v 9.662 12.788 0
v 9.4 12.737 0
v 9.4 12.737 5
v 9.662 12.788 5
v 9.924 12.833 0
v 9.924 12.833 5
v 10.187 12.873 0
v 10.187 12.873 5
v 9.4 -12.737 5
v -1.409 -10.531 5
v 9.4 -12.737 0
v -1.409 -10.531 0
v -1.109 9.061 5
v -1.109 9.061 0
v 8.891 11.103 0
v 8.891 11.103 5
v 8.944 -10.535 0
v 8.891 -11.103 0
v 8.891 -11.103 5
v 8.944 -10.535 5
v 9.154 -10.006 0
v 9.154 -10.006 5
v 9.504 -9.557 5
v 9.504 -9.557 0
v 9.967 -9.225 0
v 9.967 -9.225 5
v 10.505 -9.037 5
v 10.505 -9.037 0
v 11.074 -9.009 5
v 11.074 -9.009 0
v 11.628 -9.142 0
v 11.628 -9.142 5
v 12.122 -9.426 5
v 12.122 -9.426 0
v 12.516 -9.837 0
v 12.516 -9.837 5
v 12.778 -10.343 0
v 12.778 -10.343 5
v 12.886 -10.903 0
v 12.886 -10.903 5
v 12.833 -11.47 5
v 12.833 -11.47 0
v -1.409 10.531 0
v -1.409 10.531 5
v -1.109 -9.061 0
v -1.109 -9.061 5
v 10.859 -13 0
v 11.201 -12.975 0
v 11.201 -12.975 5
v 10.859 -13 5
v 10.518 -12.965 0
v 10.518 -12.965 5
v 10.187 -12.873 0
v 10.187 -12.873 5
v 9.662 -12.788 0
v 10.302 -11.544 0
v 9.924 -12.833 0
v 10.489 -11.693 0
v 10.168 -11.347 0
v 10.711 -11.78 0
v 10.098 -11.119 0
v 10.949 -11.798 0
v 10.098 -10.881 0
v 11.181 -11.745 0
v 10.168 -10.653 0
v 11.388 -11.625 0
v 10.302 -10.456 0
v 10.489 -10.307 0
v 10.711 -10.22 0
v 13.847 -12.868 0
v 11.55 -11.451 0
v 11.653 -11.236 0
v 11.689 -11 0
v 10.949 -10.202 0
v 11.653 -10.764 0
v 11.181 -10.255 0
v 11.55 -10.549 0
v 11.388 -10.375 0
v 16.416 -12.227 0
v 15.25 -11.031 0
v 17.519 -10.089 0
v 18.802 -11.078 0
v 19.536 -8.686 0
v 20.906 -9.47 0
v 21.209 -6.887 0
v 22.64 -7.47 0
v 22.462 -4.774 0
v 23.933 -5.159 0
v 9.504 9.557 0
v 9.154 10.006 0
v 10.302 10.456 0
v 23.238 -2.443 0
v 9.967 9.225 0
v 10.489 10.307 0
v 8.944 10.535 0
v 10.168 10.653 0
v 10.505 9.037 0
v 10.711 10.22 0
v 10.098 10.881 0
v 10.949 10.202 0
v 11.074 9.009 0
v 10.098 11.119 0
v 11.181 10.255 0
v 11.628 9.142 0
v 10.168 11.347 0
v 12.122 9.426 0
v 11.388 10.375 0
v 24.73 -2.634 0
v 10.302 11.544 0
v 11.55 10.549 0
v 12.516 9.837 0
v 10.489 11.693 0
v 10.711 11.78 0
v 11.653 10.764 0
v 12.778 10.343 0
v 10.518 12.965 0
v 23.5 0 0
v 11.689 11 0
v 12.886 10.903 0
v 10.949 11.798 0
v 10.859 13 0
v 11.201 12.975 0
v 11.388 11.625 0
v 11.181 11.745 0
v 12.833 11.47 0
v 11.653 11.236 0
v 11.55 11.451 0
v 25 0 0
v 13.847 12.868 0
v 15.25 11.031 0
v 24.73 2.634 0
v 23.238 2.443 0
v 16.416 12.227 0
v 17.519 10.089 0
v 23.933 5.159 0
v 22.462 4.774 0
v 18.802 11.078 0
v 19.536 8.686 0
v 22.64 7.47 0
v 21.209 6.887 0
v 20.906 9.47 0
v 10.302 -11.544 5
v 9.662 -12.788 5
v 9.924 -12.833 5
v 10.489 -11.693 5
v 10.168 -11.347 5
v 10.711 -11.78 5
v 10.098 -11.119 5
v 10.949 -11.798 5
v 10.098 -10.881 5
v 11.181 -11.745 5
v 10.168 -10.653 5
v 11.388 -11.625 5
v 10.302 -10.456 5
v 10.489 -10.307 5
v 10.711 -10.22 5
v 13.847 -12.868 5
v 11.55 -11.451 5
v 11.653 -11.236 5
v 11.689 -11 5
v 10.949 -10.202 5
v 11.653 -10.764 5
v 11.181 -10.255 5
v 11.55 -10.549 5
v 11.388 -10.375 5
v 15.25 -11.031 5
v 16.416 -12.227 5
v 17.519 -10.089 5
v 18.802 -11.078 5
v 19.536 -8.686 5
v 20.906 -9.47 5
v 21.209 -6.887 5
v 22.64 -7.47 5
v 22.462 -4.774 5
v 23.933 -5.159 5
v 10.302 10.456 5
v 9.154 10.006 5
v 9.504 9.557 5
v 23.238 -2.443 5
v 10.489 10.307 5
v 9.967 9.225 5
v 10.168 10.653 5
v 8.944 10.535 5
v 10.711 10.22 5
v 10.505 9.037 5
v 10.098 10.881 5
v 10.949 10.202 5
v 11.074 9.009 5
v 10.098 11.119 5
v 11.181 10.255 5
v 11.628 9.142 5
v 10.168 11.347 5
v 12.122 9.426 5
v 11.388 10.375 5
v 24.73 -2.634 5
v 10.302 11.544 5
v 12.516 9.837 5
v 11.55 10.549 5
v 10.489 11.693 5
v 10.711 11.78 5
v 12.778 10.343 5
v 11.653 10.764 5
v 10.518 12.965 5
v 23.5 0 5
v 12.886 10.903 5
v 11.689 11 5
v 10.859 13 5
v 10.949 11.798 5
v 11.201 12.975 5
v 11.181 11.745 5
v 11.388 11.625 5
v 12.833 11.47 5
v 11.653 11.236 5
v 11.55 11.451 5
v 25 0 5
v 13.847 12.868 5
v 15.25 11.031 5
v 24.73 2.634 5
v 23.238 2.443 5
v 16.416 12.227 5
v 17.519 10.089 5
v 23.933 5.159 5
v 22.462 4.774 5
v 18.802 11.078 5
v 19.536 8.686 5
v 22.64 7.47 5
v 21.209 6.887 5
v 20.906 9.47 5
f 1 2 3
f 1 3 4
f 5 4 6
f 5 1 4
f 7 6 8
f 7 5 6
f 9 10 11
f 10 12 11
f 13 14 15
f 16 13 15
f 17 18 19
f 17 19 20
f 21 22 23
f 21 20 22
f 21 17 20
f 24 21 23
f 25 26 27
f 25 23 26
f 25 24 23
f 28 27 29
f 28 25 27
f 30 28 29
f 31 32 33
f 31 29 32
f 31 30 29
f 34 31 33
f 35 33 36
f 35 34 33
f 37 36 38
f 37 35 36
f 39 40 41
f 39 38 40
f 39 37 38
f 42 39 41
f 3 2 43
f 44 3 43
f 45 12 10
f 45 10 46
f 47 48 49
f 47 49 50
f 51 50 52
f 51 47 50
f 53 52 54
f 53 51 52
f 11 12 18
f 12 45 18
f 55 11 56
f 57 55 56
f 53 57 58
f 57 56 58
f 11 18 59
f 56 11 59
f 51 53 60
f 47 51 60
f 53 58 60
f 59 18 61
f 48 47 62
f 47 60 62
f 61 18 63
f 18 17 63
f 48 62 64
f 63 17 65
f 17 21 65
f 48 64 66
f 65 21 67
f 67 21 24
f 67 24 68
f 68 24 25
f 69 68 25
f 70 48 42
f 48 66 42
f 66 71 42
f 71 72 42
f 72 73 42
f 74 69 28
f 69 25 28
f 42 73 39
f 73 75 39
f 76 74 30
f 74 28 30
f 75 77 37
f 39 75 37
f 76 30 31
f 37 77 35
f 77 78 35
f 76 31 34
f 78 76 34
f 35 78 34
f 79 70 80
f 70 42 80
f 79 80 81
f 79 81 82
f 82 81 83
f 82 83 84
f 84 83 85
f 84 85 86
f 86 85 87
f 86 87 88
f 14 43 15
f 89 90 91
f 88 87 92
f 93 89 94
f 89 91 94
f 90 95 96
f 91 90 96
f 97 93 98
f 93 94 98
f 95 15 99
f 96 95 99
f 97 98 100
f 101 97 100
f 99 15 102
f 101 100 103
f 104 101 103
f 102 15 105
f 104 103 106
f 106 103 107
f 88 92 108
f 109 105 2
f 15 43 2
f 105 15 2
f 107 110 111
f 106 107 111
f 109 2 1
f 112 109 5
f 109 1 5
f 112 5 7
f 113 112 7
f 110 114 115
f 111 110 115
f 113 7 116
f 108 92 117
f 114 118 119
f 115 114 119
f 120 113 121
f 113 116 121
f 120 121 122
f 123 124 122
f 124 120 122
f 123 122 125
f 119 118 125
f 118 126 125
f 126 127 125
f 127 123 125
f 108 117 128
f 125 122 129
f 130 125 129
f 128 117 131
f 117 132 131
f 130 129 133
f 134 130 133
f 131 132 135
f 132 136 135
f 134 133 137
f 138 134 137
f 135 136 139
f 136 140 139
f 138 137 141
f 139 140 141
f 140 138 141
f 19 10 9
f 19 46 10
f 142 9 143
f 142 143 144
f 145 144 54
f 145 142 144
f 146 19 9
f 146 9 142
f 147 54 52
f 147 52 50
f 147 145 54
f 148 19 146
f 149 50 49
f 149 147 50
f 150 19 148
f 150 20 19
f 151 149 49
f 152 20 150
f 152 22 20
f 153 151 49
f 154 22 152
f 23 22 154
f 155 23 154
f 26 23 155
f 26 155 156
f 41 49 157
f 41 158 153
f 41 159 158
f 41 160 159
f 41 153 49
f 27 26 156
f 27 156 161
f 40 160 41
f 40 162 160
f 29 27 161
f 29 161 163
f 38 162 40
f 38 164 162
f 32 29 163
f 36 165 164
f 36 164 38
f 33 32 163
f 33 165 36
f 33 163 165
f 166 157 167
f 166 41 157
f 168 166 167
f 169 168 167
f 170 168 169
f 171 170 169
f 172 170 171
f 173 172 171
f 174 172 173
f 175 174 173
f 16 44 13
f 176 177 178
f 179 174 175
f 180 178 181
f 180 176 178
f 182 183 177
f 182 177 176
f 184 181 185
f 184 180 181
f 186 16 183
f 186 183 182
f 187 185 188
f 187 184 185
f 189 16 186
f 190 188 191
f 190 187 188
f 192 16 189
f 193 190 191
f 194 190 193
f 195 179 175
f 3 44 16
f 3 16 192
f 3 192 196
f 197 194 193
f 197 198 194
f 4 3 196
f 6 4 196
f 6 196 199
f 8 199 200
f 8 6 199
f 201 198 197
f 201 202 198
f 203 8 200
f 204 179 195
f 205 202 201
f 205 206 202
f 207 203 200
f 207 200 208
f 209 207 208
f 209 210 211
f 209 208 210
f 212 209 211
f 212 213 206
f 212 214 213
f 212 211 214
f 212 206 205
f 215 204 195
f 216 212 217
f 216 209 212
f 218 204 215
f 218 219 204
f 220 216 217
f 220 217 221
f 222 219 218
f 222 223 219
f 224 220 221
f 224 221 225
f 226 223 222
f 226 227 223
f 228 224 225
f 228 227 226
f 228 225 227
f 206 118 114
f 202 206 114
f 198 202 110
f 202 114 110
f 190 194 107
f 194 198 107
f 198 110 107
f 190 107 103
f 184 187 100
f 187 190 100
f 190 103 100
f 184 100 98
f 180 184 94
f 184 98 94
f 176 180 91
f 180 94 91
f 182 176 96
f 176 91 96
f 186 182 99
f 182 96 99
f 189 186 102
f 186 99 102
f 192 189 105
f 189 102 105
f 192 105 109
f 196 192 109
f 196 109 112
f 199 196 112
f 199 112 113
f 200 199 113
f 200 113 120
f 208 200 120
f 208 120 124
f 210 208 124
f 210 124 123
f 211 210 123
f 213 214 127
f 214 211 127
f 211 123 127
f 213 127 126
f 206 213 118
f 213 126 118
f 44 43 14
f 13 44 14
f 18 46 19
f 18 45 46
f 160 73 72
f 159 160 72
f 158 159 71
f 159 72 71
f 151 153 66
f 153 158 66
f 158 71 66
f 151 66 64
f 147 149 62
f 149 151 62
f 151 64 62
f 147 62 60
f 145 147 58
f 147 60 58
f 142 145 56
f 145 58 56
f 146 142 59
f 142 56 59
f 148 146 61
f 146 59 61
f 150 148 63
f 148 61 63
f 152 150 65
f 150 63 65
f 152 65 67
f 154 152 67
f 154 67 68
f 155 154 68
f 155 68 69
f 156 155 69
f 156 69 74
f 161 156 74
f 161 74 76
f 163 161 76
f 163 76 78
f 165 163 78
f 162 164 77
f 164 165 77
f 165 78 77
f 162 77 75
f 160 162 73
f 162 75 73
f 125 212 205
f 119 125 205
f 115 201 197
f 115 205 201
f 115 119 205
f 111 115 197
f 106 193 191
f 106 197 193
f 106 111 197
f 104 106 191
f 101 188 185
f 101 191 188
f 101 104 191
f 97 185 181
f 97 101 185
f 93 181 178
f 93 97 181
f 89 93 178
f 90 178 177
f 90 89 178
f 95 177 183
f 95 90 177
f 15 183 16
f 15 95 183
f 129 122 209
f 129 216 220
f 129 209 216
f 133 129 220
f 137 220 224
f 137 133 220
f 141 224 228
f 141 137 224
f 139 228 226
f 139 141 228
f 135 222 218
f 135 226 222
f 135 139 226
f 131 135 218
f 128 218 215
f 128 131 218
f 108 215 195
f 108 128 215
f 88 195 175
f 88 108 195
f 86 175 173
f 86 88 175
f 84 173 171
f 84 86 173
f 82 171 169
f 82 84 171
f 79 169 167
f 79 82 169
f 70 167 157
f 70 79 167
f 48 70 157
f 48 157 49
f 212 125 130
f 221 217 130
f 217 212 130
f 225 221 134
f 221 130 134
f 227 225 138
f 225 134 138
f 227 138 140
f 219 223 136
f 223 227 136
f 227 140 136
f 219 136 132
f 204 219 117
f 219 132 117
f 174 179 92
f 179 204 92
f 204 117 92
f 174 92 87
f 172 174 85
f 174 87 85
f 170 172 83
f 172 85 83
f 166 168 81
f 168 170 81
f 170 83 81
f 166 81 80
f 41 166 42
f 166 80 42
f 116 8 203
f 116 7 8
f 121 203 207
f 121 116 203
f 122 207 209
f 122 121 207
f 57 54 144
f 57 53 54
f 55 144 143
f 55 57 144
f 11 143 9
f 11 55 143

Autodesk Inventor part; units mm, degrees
ref_plane "YZ Plane" through (0, 0, 0) normal (1, 0, 0) x (0, 1, 0)
ref_plane "XZ Plane" through (0, 0, 0) normal (0, 1, 0) x (-1, 0, 0)
ref_plane "XY Plane" through (0, 0, 0) normal (0, 0, 1) x (1, 0, 0)
ref_plane "作業平面1" through (0, 0, 0) normal (0, 0, 1) x (1, 0, 0)
sketch "スケッチ1" plane through (0, 0, 0) normal (0, 0, 1) x (1, 0, 0)
  arc A0 (9.4, -12.7373) -> (9.4, 12.7373) centre (12, 0) ccw projected
  circle A1 centre (10.8888, 11) radius 0.8 projected
  circle A2 centre (10.8888, -11) radius 0.8 projected
  circle A3 centre (10.8888, 11) radius 2
  circle A4 centre (10.8888, -11) radius 2
  arc A5 (12.8328, -11.4698) -> (12.8328, 11.4698) centre (12, 0) ccw
  line L0 (9.4, 12.7373) -> (-19.4, 6.8586) projected
  line L1 (-19.4, -6.8586) -> (9.4, -12.7373) projected
  line L2 (-1.4086, 10.5311) -> (-1.1086, 9.0614)
  line L3 (-1.1086, 9.0614) -> (8.8914, 11.1026)
  line L4 (-1.4086, -10.5311) -> (-1.1086, -9.0614)
  line L5 (-1.1086, -9.0614) -> (8.8914, -11.1026)
  point P0 (0, 0)
  point P1 (10.1875, -12.873)
  point P2 (11.2013, -12.9754)
  point P3 (11.2013, 12.9754)
  point P4 (10.1875, 12.873)
  dimension "d0" = 4
  dimension "d1" = 1.5
  dimension "d2" = 1.5
  dimension "d3" = 10
extrude "押し出し1" add sketch "スケッチ1" along normal blind 5
properties part number "MotorCover"
